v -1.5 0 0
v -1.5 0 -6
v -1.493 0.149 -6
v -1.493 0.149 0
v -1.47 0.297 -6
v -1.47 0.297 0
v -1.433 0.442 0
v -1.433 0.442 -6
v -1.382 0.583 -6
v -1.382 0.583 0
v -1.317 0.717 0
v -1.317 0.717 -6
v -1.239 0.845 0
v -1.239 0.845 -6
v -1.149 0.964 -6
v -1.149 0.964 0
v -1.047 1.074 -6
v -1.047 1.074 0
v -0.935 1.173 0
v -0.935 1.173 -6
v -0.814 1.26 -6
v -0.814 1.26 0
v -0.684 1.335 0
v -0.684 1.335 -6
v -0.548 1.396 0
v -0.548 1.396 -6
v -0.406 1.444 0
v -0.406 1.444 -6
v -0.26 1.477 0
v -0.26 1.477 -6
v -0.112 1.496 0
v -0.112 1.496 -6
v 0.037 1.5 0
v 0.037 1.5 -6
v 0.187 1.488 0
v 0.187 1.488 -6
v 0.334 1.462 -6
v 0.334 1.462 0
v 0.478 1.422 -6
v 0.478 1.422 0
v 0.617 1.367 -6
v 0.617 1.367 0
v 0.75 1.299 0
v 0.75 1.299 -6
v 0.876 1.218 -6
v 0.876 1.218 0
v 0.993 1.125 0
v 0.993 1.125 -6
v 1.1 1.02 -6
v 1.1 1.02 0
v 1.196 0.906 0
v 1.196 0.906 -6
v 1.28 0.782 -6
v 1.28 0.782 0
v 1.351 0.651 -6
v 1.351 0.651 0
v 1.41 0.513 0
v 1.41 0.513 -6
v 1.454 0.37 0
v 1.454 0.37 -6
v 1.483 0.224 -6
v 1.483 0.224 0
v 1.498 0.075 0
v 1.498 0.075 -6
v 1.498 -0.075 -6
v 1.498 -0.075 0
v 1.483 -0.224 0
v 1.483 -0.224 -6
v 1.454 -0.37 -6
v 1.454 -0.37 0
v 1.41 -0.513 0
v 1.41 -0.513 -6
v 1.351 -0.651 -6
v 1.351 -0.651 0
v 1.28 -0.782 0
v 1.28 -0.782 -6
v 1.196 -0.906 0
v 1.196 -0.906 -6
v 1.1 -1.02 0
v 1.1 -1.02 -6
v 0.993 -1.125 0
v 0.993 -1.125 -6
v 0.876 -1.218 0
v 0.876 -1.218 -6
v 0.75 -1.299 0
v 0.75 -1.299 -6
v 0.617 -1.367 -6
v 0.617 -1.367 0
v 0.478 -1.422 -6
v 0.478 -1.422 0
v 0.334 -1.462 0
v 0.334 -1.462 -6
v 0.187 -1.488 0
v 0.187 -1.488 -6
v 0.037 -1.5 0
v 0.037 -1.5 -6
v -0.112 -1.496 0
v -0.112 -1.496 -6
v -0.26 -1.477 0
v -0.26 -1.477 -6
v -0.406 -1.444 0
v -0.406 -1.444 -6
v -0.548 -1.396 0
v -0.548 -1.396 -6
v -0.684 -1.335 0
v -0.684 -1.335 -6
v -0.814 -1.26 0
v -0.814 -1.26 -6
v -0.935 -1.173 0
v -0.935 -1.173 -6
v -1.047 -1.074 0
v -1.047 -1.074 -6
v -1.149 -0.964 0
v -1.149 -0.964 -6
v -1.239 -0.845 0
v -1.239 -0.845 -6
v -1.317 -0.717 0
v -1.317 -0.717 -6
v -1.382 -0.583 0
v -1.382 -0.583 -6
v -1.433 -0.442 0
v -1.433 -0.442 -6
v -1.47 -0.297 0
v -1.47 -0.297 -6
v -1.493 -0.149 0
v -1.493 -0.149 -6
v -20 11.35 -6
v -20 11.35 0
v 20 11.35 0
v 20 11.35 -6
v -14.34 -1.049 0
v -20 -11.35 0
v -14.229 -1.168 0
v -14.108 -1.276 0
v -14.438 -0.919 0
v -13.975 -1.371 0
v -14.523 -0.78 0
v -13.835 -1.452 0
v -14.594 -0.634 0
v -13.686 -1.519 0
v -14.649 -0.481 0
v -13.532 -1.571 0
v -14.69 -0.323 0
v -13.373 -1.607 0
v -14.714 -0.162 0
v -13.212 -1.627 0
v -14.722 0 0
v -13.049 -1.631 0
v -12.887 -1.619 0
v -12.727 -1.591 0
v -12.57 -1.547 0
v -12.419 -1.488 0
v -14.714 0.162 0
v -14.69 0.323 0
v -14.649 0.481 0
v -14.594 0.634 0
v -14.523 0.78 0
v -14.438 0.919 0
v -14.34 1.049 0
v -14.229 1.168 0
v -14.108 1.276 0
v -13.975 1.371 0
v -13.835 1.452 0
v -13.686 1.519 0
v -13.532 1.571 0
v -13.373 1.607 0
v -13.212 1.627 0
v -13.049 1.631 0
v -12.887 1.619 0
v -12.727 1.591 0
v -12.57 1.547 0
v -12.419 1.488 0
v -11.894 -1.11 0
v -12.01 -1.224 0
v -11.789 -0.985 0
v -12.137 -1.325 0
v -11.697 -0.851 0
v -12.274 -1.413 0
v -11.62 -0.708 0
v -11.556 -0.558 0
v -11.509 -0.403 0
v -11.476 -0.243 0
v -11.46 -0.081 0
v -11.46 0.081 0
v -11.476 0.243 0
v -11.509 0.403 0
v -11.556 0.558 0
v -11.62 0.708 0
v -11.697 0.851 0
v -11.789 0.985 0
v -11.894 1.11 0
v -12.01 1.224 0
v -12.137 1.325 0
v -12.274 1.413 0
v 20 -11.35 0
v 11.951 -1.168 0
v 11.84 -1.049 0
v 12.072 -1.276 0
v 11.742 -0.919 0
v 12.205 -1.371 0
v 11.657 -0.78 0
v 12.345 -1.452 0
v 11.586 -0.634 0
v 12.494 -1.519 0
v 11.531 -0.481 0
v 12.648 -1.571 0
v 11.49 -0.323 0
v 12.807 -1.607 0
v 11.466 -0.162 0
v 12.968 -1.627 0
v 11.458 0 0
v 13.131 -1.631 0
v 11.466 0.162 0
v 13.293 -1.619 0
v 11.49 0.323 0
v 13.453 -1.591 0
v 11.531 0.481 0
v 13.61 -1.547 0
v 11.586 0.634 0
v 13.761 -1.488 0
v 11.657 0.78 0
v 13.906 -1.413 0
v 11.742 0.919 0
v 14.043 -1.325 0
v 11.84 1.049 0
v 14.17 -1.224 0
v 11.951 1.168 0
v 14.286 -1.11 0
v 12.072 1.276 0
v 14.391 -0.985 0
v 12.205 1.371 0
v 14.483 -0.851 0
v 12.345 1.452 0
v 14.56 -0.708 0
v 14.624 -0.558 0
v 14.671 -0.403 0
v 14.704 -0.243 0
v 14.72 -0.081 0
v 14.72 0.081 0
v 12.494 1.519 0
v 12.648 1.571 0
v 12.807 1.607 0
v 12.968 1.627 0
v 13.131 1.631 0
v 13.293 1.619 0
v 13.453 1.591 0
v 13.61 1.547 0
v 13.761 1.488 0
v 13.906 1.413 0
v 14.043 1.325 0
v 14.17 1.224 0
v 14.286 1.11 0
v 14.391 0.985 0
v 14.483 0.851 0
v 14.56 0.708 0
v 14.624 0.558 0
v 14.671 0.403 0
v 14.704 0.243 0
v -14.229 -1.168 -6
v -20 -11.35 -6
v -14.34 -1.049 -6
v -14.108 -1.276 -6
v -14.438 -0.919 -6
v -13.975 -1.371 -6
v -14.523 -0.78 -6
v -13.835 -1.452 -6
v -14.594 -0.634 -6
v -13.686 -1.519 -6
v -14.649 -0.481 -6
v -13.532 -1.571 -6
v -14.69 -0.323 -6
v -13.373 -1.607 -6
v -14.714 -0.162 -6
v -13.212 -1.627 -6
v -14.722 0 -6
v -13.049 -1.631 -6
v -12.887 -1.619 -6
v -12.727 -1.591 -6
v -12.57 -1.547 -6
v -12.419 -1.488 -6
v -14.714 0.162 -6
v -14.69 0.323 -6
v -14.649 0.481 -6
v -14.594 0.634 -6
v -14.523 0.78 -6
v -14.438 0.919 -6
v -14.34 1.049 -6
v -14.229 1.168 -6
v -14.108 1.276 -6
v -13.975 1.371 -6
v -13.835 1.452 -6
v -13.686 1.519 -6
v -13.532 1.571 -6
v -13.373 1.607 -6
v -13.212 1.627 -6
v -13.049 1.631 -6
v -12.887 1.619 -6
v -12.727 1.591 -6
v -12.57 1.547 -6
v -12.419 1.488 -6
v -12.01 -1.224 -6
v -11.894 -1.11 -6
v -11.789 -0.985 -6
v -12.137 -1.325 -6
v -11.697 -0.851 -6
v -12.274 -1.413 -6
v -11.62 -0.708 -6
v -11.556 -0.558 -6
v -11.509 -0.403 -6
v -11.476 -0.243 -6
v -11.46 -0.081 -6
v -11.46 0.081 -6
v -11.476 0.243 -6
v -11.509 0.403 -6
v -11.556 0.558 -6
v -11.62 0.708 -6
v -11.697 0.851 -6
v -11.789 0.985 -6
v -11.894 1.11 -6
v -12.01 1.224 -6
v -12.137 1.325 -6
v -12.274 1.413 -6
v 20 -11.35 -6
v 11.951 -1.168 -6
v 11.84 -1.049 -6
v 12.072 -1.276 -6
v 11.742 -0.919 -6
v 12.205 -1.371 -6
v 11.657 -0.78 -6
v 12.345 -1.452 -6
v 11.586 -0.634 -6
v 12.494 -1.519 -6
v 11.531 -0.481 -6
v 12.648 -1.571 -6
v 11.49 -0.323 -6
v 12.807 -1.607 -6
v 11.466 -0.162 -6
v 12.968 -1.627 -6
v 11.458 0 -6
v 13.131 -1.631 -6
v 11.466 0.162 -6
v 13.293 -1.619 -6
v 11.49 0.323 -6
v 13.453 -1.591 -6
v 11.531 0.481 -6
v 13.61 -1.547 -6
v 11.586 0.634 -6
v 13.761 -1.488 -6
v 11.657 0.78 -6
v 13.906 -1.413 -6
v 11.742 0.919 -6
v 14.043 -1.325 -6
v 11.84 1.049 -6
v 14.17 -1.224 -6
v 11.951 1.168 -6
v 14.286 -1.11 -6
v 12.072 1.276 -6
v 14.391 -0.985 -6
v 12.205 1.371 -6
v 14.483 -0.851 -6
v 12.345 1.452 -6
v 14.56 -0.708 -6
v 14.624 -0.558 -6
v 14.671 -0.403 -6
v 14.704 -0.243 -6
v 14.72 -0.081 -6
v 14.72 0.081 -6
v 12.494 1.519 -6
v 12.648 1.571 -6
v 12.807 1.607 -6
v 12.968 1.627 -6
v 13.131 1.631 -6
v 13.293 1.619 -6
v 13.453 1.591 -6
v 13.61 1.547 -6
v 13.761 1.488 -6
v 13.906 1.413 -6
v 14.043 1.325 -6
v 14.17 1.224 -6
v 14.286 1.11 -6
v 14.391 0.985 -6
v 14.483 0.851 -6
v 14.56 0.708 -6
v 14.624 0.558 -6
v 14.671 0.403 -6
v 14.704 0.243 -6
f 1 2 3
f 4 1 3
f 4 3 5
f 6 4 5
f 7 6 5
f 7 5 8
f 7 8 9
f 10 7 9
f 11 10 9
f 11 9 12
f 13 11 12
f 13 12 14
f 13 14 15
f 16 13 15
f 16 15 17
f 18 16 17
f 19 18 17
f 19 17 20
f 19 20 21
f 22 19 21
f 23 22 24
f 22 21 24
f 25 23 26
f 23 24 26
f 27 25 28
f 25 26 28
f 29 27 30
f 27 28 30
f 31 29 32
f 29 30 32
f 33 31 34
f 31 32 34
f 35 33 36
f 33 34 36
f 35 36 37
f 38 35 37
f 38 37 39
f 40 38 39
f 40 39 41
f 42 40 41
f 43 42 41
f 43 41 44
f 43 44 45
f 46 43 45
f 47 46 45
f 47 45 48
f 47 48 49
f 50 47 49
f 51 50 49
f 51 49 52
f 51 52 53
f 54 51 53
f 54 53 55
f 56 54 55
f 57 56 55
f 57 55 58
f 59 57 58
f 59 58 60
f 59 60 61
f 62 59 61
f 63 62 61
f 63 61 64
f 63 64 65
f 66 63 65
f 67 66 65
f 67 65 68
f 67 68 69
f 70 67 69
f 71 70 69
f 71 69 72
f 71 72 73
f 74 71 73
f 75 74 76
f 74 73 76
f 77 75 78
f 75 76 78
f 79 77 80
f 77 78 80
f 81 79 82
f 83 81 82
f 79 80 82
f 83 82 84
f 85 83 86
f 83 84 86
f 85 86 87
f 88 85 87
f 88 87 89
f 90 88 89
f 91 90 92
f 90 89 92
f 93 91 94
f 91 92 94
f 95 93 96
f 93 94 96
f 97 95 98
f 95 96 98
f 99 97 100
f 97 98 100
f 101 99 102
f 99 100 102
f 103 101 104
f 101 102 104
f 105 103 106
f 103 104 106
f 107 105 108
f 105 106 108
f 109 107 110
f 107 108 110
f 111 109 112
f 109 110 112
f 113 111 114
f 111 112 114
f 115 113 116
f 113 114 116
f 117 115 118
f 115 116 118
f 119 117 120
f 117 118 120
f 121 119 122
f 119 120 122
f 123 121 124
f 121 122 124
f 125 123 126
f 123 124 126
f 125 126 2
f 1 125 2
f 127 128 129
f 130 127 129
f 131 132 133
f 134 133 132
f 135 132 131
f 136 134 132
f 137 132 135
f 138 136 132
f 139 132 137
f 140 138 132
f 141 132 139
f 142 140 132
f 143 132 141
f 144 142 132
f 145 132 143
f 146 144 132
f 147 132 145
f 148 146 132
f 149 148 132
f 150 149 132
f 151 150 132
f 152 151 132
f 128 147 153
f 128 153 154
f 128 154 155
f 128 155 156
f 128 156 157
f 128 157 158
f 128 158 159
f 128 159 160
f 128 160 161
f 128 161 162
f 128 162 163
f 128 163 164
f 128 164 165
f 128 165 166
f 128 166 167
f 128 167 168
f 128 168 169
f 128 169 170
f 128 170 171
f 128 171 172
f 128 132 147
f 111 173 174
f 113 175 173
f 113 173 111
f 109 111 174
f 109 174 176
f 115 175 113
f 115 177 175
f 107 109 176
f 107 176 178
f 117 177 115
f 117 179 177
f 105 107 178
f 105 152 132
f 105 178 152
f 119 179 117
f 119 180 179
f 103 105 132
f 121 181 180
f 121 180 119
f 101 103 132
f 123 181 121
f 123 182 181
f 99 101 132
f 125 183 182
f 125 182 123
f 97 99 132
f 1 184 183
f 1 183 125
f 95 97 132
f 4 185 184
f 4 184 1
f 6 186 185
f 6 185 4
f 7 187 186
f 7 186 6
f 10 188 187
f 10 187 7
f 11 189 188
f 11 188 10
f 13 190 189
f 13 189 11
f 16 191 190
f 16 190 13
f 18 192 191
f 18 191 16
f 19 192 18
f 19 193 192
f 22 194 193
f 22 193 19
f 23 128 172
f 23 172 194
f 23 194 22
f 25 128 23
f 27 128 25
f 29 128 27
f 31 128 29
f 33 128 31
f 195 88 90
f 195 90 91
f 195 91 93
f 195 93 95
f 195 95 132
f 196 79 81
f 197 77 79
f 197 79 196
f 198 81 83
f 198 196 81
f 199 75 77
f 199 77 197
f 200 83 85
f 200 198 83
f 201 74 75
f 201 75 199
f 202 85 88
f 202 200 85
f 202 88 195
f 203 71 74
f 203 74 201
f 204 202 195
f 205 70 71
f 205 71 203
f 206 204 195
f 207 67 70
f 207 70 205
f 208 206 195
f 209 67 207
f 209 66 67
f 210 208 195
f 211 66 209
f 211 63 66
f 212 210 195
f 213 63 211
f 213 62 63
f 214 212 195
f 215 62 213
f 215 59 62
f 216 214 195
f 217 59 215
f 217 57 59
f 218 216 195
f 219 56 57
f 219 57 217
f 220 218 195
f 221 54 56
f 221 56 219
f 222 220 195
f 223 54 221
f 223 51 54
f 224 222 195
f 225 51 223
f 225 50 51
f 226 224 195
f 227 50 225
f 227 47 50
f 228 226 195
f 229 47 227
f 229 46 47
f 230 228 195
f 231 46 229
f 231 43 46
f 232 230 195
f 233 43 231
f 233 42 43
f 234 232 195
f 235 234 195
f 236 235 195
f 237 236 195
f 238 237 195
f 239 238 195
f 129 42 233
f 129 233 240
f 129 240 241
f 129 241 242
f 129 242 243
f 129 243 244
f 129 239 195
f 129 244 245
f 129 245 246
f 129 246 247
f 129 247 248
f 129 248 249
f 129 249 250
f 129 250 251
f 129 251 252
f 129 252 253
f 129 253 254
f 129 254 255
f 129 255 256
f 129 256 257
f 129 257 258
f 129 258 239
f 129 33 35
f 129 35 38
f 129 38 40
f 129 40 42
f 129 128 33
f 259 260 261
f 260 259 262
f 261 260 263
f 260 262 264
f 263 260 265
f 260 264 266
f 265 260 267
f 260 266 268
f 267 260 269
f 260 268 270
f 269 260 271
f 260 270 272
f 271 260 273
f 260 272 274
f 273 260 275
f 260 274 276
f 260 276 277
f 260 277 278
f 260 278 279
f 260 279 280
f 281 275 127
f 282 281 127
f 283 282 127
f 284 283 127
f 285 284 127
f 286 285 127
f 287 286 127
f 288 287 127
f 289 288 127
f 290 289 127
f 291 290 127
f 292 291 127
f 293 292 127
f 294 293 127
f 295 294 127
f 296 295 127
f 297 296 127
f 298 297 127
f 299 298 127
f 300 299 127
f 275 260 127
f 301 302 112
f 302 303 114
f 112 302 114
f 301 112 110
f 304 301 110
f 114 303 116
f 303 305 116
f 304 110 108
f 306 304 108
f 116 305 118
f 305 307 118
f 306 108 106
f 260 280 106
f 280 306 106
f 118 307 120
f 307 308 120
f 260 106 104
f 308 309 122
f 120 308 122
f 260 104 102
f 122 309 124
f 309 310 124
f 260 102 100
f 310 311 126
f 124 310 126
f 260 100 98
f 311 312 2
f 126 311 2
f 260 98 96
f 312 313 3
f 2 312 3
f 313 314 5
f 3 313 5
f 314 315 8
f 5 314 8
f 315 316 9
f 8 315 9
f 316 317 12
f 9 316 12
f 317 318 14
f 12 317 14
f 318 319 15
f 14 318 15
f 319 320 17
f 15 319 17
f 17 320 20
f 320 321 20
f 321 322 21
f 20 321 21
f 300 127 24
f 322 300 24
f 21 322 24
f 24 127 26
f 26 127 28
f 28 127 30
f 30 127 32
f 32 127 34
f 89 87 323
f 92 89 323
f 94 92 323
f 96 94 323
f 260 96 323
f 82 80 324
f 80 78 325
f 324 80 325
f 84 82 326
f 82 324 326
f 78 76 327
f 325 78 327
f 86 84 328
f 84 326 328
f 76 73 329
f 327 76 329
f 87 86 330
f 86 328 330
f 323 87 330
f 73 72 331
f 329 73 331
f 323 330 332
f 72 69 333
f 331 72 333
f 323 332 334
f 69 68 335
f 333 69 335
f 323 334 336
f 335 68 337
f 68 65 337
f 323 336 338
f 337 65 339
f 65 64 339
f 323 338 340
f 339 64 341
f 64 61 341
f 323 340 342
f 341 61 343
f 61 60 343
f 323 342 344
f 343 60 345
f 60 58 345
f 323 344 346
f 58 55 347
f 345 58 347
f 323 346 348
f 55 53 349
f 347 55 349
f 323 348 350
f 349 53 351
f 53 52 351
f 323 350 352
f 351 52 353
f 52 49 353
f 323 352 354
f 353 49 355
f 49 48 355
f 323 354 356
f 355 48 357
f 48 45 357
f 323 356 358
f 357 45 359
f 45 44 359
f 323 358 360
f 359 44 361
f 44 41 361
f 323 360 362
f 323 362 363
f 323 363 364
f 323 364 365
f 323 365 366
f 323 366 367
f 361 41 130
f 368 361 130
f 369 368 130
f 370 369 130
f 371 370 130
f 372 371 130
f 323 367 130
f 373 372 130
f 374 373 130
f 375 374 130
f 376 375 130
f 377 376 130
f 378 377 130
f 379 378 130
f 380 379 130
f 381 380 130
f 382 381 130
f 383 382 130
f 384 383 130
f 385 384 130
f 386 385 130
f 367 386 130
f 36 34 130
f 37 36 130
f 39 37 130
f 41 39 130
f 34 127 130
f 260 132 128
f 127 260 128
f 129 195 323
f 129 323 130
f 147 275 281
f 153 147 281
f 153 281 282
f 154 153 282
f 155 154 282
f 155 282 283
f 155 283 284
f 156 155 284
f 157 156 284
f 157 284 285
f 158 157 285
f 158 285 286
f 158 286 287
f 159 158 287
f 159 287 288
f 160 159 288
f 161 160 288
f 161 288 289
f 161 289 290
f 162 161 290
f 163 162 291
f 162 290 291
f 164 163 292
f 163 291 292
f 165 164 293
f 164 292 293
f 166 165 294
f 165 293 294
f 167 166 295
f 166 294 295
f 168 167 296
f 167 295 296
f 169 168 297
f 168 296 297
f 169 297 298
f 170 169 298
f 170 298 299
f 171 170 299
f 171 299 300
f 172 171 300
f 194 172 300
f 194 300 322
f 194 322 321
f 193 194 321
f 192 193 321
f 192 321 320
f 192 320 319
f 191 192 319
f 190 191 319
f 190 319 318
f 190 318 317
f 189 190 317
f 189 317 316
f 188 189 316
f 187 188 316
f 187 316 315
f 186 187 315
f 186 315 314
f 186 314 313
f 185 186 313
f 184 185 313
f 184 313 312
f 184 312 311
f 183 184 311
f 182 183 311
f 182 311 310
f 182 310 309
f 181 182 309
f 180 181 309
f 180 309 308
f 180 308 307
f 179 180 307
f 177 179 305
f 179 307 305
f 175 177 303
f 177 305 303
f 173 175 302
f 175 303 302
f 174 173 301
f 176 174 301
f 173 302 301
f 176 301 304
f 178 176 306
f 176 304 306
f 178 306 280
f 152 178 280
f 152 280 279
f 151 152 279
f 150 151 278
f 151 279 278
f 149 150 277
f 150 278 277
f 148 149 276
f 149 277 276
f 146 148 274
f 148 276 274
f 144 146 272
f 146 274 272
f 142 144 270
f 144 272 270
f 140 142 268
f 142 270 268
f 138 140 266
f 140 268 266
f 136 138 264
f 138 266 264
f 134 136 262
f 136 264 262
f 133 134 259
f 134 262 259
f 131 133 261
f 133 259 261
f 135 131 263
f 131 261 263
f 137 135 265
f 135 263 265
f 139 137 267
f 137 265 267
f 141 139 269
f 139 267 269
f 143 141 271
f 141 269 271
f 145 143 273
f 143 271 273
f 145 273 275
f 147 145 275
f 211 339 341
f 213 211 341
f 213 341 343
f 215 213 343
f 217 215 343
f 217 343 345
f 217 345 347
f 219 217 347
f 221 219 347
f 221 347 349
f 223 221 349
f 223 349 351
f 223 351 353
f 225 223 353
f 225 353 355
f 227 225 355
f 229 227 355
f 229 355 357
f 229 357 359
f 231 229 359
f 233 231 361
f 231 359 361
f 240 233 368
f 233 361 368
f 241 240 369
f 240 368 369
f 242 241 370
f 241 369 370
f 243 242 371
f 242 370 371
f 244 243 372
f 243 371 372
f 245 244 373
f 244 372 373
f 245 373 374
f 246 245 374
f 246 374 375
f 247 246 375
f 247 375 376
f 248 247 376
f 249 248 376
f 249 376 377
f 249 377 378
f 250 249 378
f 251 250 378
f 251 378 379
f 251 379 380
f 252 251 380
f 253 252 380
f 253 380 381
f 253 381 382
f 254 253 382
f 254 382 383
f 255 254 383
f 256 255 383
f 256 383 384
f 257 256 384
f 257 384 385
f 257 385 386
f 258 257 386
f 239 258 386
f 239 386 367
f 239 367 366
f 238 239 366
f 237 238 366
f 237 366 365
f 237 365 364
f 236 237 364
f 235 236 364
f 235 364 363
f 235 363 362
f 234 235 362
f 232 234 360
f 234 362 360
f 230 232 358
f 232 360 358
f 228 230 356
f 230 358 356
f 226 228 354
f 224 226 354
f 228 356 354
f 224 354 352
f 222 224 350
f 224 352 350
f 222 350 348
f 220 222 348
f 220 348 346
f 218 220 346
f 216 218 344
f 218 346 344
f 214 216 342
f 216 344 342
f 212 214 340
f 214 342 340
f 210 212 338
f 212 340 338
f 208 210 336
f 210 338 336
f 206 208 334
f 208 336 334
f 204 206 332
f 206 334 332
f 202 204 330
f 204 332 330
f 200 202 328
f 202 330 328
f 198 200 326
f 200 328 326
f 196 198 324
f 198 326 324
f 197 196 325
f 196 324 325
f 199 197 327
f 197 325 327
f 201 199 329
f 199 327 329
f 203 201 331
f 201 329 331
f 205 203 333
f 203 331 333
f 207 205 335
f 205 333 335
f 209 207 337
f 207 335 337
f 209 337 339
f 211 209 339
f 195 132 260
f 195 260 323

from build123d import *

# Parameters (mm, degrees)
SKETCH1_W             = 40
SKETCH1_H             = 22.7
BOSS_EXTRUDE1_DEPTH   = 6
F_4_CLEARANCE_HOLE1_D = 3.2639
F_3_0MM_DOWEL_HOLE1_D = 3


with BuildPart() as part:
    # Sketch1 → Boss-Extrude1 (new body)
    with BuildSketch(Plane.XY):
        Rectangle(SKETCH1_W, SKETCH1_H)
    extrude(amount=-BOSS_EXTRUDE1_DEPTH)

    # #4 Clearance Hole1 (through all)
    with Locations(Plane.XY):
        with Locations((-13.09, 0), (13.09, 0)):
            Hole(F_4_CLEARANCE_HOLE1_D / 2)

    # Ø3.0mm Dowel Hole1 (through all)
    with Locations(Plane.XY):
        with Locations((0, 0)):
            Hole(F_3_0MM_DOWEL_HOLE1_D / 2)


solid = part.part
